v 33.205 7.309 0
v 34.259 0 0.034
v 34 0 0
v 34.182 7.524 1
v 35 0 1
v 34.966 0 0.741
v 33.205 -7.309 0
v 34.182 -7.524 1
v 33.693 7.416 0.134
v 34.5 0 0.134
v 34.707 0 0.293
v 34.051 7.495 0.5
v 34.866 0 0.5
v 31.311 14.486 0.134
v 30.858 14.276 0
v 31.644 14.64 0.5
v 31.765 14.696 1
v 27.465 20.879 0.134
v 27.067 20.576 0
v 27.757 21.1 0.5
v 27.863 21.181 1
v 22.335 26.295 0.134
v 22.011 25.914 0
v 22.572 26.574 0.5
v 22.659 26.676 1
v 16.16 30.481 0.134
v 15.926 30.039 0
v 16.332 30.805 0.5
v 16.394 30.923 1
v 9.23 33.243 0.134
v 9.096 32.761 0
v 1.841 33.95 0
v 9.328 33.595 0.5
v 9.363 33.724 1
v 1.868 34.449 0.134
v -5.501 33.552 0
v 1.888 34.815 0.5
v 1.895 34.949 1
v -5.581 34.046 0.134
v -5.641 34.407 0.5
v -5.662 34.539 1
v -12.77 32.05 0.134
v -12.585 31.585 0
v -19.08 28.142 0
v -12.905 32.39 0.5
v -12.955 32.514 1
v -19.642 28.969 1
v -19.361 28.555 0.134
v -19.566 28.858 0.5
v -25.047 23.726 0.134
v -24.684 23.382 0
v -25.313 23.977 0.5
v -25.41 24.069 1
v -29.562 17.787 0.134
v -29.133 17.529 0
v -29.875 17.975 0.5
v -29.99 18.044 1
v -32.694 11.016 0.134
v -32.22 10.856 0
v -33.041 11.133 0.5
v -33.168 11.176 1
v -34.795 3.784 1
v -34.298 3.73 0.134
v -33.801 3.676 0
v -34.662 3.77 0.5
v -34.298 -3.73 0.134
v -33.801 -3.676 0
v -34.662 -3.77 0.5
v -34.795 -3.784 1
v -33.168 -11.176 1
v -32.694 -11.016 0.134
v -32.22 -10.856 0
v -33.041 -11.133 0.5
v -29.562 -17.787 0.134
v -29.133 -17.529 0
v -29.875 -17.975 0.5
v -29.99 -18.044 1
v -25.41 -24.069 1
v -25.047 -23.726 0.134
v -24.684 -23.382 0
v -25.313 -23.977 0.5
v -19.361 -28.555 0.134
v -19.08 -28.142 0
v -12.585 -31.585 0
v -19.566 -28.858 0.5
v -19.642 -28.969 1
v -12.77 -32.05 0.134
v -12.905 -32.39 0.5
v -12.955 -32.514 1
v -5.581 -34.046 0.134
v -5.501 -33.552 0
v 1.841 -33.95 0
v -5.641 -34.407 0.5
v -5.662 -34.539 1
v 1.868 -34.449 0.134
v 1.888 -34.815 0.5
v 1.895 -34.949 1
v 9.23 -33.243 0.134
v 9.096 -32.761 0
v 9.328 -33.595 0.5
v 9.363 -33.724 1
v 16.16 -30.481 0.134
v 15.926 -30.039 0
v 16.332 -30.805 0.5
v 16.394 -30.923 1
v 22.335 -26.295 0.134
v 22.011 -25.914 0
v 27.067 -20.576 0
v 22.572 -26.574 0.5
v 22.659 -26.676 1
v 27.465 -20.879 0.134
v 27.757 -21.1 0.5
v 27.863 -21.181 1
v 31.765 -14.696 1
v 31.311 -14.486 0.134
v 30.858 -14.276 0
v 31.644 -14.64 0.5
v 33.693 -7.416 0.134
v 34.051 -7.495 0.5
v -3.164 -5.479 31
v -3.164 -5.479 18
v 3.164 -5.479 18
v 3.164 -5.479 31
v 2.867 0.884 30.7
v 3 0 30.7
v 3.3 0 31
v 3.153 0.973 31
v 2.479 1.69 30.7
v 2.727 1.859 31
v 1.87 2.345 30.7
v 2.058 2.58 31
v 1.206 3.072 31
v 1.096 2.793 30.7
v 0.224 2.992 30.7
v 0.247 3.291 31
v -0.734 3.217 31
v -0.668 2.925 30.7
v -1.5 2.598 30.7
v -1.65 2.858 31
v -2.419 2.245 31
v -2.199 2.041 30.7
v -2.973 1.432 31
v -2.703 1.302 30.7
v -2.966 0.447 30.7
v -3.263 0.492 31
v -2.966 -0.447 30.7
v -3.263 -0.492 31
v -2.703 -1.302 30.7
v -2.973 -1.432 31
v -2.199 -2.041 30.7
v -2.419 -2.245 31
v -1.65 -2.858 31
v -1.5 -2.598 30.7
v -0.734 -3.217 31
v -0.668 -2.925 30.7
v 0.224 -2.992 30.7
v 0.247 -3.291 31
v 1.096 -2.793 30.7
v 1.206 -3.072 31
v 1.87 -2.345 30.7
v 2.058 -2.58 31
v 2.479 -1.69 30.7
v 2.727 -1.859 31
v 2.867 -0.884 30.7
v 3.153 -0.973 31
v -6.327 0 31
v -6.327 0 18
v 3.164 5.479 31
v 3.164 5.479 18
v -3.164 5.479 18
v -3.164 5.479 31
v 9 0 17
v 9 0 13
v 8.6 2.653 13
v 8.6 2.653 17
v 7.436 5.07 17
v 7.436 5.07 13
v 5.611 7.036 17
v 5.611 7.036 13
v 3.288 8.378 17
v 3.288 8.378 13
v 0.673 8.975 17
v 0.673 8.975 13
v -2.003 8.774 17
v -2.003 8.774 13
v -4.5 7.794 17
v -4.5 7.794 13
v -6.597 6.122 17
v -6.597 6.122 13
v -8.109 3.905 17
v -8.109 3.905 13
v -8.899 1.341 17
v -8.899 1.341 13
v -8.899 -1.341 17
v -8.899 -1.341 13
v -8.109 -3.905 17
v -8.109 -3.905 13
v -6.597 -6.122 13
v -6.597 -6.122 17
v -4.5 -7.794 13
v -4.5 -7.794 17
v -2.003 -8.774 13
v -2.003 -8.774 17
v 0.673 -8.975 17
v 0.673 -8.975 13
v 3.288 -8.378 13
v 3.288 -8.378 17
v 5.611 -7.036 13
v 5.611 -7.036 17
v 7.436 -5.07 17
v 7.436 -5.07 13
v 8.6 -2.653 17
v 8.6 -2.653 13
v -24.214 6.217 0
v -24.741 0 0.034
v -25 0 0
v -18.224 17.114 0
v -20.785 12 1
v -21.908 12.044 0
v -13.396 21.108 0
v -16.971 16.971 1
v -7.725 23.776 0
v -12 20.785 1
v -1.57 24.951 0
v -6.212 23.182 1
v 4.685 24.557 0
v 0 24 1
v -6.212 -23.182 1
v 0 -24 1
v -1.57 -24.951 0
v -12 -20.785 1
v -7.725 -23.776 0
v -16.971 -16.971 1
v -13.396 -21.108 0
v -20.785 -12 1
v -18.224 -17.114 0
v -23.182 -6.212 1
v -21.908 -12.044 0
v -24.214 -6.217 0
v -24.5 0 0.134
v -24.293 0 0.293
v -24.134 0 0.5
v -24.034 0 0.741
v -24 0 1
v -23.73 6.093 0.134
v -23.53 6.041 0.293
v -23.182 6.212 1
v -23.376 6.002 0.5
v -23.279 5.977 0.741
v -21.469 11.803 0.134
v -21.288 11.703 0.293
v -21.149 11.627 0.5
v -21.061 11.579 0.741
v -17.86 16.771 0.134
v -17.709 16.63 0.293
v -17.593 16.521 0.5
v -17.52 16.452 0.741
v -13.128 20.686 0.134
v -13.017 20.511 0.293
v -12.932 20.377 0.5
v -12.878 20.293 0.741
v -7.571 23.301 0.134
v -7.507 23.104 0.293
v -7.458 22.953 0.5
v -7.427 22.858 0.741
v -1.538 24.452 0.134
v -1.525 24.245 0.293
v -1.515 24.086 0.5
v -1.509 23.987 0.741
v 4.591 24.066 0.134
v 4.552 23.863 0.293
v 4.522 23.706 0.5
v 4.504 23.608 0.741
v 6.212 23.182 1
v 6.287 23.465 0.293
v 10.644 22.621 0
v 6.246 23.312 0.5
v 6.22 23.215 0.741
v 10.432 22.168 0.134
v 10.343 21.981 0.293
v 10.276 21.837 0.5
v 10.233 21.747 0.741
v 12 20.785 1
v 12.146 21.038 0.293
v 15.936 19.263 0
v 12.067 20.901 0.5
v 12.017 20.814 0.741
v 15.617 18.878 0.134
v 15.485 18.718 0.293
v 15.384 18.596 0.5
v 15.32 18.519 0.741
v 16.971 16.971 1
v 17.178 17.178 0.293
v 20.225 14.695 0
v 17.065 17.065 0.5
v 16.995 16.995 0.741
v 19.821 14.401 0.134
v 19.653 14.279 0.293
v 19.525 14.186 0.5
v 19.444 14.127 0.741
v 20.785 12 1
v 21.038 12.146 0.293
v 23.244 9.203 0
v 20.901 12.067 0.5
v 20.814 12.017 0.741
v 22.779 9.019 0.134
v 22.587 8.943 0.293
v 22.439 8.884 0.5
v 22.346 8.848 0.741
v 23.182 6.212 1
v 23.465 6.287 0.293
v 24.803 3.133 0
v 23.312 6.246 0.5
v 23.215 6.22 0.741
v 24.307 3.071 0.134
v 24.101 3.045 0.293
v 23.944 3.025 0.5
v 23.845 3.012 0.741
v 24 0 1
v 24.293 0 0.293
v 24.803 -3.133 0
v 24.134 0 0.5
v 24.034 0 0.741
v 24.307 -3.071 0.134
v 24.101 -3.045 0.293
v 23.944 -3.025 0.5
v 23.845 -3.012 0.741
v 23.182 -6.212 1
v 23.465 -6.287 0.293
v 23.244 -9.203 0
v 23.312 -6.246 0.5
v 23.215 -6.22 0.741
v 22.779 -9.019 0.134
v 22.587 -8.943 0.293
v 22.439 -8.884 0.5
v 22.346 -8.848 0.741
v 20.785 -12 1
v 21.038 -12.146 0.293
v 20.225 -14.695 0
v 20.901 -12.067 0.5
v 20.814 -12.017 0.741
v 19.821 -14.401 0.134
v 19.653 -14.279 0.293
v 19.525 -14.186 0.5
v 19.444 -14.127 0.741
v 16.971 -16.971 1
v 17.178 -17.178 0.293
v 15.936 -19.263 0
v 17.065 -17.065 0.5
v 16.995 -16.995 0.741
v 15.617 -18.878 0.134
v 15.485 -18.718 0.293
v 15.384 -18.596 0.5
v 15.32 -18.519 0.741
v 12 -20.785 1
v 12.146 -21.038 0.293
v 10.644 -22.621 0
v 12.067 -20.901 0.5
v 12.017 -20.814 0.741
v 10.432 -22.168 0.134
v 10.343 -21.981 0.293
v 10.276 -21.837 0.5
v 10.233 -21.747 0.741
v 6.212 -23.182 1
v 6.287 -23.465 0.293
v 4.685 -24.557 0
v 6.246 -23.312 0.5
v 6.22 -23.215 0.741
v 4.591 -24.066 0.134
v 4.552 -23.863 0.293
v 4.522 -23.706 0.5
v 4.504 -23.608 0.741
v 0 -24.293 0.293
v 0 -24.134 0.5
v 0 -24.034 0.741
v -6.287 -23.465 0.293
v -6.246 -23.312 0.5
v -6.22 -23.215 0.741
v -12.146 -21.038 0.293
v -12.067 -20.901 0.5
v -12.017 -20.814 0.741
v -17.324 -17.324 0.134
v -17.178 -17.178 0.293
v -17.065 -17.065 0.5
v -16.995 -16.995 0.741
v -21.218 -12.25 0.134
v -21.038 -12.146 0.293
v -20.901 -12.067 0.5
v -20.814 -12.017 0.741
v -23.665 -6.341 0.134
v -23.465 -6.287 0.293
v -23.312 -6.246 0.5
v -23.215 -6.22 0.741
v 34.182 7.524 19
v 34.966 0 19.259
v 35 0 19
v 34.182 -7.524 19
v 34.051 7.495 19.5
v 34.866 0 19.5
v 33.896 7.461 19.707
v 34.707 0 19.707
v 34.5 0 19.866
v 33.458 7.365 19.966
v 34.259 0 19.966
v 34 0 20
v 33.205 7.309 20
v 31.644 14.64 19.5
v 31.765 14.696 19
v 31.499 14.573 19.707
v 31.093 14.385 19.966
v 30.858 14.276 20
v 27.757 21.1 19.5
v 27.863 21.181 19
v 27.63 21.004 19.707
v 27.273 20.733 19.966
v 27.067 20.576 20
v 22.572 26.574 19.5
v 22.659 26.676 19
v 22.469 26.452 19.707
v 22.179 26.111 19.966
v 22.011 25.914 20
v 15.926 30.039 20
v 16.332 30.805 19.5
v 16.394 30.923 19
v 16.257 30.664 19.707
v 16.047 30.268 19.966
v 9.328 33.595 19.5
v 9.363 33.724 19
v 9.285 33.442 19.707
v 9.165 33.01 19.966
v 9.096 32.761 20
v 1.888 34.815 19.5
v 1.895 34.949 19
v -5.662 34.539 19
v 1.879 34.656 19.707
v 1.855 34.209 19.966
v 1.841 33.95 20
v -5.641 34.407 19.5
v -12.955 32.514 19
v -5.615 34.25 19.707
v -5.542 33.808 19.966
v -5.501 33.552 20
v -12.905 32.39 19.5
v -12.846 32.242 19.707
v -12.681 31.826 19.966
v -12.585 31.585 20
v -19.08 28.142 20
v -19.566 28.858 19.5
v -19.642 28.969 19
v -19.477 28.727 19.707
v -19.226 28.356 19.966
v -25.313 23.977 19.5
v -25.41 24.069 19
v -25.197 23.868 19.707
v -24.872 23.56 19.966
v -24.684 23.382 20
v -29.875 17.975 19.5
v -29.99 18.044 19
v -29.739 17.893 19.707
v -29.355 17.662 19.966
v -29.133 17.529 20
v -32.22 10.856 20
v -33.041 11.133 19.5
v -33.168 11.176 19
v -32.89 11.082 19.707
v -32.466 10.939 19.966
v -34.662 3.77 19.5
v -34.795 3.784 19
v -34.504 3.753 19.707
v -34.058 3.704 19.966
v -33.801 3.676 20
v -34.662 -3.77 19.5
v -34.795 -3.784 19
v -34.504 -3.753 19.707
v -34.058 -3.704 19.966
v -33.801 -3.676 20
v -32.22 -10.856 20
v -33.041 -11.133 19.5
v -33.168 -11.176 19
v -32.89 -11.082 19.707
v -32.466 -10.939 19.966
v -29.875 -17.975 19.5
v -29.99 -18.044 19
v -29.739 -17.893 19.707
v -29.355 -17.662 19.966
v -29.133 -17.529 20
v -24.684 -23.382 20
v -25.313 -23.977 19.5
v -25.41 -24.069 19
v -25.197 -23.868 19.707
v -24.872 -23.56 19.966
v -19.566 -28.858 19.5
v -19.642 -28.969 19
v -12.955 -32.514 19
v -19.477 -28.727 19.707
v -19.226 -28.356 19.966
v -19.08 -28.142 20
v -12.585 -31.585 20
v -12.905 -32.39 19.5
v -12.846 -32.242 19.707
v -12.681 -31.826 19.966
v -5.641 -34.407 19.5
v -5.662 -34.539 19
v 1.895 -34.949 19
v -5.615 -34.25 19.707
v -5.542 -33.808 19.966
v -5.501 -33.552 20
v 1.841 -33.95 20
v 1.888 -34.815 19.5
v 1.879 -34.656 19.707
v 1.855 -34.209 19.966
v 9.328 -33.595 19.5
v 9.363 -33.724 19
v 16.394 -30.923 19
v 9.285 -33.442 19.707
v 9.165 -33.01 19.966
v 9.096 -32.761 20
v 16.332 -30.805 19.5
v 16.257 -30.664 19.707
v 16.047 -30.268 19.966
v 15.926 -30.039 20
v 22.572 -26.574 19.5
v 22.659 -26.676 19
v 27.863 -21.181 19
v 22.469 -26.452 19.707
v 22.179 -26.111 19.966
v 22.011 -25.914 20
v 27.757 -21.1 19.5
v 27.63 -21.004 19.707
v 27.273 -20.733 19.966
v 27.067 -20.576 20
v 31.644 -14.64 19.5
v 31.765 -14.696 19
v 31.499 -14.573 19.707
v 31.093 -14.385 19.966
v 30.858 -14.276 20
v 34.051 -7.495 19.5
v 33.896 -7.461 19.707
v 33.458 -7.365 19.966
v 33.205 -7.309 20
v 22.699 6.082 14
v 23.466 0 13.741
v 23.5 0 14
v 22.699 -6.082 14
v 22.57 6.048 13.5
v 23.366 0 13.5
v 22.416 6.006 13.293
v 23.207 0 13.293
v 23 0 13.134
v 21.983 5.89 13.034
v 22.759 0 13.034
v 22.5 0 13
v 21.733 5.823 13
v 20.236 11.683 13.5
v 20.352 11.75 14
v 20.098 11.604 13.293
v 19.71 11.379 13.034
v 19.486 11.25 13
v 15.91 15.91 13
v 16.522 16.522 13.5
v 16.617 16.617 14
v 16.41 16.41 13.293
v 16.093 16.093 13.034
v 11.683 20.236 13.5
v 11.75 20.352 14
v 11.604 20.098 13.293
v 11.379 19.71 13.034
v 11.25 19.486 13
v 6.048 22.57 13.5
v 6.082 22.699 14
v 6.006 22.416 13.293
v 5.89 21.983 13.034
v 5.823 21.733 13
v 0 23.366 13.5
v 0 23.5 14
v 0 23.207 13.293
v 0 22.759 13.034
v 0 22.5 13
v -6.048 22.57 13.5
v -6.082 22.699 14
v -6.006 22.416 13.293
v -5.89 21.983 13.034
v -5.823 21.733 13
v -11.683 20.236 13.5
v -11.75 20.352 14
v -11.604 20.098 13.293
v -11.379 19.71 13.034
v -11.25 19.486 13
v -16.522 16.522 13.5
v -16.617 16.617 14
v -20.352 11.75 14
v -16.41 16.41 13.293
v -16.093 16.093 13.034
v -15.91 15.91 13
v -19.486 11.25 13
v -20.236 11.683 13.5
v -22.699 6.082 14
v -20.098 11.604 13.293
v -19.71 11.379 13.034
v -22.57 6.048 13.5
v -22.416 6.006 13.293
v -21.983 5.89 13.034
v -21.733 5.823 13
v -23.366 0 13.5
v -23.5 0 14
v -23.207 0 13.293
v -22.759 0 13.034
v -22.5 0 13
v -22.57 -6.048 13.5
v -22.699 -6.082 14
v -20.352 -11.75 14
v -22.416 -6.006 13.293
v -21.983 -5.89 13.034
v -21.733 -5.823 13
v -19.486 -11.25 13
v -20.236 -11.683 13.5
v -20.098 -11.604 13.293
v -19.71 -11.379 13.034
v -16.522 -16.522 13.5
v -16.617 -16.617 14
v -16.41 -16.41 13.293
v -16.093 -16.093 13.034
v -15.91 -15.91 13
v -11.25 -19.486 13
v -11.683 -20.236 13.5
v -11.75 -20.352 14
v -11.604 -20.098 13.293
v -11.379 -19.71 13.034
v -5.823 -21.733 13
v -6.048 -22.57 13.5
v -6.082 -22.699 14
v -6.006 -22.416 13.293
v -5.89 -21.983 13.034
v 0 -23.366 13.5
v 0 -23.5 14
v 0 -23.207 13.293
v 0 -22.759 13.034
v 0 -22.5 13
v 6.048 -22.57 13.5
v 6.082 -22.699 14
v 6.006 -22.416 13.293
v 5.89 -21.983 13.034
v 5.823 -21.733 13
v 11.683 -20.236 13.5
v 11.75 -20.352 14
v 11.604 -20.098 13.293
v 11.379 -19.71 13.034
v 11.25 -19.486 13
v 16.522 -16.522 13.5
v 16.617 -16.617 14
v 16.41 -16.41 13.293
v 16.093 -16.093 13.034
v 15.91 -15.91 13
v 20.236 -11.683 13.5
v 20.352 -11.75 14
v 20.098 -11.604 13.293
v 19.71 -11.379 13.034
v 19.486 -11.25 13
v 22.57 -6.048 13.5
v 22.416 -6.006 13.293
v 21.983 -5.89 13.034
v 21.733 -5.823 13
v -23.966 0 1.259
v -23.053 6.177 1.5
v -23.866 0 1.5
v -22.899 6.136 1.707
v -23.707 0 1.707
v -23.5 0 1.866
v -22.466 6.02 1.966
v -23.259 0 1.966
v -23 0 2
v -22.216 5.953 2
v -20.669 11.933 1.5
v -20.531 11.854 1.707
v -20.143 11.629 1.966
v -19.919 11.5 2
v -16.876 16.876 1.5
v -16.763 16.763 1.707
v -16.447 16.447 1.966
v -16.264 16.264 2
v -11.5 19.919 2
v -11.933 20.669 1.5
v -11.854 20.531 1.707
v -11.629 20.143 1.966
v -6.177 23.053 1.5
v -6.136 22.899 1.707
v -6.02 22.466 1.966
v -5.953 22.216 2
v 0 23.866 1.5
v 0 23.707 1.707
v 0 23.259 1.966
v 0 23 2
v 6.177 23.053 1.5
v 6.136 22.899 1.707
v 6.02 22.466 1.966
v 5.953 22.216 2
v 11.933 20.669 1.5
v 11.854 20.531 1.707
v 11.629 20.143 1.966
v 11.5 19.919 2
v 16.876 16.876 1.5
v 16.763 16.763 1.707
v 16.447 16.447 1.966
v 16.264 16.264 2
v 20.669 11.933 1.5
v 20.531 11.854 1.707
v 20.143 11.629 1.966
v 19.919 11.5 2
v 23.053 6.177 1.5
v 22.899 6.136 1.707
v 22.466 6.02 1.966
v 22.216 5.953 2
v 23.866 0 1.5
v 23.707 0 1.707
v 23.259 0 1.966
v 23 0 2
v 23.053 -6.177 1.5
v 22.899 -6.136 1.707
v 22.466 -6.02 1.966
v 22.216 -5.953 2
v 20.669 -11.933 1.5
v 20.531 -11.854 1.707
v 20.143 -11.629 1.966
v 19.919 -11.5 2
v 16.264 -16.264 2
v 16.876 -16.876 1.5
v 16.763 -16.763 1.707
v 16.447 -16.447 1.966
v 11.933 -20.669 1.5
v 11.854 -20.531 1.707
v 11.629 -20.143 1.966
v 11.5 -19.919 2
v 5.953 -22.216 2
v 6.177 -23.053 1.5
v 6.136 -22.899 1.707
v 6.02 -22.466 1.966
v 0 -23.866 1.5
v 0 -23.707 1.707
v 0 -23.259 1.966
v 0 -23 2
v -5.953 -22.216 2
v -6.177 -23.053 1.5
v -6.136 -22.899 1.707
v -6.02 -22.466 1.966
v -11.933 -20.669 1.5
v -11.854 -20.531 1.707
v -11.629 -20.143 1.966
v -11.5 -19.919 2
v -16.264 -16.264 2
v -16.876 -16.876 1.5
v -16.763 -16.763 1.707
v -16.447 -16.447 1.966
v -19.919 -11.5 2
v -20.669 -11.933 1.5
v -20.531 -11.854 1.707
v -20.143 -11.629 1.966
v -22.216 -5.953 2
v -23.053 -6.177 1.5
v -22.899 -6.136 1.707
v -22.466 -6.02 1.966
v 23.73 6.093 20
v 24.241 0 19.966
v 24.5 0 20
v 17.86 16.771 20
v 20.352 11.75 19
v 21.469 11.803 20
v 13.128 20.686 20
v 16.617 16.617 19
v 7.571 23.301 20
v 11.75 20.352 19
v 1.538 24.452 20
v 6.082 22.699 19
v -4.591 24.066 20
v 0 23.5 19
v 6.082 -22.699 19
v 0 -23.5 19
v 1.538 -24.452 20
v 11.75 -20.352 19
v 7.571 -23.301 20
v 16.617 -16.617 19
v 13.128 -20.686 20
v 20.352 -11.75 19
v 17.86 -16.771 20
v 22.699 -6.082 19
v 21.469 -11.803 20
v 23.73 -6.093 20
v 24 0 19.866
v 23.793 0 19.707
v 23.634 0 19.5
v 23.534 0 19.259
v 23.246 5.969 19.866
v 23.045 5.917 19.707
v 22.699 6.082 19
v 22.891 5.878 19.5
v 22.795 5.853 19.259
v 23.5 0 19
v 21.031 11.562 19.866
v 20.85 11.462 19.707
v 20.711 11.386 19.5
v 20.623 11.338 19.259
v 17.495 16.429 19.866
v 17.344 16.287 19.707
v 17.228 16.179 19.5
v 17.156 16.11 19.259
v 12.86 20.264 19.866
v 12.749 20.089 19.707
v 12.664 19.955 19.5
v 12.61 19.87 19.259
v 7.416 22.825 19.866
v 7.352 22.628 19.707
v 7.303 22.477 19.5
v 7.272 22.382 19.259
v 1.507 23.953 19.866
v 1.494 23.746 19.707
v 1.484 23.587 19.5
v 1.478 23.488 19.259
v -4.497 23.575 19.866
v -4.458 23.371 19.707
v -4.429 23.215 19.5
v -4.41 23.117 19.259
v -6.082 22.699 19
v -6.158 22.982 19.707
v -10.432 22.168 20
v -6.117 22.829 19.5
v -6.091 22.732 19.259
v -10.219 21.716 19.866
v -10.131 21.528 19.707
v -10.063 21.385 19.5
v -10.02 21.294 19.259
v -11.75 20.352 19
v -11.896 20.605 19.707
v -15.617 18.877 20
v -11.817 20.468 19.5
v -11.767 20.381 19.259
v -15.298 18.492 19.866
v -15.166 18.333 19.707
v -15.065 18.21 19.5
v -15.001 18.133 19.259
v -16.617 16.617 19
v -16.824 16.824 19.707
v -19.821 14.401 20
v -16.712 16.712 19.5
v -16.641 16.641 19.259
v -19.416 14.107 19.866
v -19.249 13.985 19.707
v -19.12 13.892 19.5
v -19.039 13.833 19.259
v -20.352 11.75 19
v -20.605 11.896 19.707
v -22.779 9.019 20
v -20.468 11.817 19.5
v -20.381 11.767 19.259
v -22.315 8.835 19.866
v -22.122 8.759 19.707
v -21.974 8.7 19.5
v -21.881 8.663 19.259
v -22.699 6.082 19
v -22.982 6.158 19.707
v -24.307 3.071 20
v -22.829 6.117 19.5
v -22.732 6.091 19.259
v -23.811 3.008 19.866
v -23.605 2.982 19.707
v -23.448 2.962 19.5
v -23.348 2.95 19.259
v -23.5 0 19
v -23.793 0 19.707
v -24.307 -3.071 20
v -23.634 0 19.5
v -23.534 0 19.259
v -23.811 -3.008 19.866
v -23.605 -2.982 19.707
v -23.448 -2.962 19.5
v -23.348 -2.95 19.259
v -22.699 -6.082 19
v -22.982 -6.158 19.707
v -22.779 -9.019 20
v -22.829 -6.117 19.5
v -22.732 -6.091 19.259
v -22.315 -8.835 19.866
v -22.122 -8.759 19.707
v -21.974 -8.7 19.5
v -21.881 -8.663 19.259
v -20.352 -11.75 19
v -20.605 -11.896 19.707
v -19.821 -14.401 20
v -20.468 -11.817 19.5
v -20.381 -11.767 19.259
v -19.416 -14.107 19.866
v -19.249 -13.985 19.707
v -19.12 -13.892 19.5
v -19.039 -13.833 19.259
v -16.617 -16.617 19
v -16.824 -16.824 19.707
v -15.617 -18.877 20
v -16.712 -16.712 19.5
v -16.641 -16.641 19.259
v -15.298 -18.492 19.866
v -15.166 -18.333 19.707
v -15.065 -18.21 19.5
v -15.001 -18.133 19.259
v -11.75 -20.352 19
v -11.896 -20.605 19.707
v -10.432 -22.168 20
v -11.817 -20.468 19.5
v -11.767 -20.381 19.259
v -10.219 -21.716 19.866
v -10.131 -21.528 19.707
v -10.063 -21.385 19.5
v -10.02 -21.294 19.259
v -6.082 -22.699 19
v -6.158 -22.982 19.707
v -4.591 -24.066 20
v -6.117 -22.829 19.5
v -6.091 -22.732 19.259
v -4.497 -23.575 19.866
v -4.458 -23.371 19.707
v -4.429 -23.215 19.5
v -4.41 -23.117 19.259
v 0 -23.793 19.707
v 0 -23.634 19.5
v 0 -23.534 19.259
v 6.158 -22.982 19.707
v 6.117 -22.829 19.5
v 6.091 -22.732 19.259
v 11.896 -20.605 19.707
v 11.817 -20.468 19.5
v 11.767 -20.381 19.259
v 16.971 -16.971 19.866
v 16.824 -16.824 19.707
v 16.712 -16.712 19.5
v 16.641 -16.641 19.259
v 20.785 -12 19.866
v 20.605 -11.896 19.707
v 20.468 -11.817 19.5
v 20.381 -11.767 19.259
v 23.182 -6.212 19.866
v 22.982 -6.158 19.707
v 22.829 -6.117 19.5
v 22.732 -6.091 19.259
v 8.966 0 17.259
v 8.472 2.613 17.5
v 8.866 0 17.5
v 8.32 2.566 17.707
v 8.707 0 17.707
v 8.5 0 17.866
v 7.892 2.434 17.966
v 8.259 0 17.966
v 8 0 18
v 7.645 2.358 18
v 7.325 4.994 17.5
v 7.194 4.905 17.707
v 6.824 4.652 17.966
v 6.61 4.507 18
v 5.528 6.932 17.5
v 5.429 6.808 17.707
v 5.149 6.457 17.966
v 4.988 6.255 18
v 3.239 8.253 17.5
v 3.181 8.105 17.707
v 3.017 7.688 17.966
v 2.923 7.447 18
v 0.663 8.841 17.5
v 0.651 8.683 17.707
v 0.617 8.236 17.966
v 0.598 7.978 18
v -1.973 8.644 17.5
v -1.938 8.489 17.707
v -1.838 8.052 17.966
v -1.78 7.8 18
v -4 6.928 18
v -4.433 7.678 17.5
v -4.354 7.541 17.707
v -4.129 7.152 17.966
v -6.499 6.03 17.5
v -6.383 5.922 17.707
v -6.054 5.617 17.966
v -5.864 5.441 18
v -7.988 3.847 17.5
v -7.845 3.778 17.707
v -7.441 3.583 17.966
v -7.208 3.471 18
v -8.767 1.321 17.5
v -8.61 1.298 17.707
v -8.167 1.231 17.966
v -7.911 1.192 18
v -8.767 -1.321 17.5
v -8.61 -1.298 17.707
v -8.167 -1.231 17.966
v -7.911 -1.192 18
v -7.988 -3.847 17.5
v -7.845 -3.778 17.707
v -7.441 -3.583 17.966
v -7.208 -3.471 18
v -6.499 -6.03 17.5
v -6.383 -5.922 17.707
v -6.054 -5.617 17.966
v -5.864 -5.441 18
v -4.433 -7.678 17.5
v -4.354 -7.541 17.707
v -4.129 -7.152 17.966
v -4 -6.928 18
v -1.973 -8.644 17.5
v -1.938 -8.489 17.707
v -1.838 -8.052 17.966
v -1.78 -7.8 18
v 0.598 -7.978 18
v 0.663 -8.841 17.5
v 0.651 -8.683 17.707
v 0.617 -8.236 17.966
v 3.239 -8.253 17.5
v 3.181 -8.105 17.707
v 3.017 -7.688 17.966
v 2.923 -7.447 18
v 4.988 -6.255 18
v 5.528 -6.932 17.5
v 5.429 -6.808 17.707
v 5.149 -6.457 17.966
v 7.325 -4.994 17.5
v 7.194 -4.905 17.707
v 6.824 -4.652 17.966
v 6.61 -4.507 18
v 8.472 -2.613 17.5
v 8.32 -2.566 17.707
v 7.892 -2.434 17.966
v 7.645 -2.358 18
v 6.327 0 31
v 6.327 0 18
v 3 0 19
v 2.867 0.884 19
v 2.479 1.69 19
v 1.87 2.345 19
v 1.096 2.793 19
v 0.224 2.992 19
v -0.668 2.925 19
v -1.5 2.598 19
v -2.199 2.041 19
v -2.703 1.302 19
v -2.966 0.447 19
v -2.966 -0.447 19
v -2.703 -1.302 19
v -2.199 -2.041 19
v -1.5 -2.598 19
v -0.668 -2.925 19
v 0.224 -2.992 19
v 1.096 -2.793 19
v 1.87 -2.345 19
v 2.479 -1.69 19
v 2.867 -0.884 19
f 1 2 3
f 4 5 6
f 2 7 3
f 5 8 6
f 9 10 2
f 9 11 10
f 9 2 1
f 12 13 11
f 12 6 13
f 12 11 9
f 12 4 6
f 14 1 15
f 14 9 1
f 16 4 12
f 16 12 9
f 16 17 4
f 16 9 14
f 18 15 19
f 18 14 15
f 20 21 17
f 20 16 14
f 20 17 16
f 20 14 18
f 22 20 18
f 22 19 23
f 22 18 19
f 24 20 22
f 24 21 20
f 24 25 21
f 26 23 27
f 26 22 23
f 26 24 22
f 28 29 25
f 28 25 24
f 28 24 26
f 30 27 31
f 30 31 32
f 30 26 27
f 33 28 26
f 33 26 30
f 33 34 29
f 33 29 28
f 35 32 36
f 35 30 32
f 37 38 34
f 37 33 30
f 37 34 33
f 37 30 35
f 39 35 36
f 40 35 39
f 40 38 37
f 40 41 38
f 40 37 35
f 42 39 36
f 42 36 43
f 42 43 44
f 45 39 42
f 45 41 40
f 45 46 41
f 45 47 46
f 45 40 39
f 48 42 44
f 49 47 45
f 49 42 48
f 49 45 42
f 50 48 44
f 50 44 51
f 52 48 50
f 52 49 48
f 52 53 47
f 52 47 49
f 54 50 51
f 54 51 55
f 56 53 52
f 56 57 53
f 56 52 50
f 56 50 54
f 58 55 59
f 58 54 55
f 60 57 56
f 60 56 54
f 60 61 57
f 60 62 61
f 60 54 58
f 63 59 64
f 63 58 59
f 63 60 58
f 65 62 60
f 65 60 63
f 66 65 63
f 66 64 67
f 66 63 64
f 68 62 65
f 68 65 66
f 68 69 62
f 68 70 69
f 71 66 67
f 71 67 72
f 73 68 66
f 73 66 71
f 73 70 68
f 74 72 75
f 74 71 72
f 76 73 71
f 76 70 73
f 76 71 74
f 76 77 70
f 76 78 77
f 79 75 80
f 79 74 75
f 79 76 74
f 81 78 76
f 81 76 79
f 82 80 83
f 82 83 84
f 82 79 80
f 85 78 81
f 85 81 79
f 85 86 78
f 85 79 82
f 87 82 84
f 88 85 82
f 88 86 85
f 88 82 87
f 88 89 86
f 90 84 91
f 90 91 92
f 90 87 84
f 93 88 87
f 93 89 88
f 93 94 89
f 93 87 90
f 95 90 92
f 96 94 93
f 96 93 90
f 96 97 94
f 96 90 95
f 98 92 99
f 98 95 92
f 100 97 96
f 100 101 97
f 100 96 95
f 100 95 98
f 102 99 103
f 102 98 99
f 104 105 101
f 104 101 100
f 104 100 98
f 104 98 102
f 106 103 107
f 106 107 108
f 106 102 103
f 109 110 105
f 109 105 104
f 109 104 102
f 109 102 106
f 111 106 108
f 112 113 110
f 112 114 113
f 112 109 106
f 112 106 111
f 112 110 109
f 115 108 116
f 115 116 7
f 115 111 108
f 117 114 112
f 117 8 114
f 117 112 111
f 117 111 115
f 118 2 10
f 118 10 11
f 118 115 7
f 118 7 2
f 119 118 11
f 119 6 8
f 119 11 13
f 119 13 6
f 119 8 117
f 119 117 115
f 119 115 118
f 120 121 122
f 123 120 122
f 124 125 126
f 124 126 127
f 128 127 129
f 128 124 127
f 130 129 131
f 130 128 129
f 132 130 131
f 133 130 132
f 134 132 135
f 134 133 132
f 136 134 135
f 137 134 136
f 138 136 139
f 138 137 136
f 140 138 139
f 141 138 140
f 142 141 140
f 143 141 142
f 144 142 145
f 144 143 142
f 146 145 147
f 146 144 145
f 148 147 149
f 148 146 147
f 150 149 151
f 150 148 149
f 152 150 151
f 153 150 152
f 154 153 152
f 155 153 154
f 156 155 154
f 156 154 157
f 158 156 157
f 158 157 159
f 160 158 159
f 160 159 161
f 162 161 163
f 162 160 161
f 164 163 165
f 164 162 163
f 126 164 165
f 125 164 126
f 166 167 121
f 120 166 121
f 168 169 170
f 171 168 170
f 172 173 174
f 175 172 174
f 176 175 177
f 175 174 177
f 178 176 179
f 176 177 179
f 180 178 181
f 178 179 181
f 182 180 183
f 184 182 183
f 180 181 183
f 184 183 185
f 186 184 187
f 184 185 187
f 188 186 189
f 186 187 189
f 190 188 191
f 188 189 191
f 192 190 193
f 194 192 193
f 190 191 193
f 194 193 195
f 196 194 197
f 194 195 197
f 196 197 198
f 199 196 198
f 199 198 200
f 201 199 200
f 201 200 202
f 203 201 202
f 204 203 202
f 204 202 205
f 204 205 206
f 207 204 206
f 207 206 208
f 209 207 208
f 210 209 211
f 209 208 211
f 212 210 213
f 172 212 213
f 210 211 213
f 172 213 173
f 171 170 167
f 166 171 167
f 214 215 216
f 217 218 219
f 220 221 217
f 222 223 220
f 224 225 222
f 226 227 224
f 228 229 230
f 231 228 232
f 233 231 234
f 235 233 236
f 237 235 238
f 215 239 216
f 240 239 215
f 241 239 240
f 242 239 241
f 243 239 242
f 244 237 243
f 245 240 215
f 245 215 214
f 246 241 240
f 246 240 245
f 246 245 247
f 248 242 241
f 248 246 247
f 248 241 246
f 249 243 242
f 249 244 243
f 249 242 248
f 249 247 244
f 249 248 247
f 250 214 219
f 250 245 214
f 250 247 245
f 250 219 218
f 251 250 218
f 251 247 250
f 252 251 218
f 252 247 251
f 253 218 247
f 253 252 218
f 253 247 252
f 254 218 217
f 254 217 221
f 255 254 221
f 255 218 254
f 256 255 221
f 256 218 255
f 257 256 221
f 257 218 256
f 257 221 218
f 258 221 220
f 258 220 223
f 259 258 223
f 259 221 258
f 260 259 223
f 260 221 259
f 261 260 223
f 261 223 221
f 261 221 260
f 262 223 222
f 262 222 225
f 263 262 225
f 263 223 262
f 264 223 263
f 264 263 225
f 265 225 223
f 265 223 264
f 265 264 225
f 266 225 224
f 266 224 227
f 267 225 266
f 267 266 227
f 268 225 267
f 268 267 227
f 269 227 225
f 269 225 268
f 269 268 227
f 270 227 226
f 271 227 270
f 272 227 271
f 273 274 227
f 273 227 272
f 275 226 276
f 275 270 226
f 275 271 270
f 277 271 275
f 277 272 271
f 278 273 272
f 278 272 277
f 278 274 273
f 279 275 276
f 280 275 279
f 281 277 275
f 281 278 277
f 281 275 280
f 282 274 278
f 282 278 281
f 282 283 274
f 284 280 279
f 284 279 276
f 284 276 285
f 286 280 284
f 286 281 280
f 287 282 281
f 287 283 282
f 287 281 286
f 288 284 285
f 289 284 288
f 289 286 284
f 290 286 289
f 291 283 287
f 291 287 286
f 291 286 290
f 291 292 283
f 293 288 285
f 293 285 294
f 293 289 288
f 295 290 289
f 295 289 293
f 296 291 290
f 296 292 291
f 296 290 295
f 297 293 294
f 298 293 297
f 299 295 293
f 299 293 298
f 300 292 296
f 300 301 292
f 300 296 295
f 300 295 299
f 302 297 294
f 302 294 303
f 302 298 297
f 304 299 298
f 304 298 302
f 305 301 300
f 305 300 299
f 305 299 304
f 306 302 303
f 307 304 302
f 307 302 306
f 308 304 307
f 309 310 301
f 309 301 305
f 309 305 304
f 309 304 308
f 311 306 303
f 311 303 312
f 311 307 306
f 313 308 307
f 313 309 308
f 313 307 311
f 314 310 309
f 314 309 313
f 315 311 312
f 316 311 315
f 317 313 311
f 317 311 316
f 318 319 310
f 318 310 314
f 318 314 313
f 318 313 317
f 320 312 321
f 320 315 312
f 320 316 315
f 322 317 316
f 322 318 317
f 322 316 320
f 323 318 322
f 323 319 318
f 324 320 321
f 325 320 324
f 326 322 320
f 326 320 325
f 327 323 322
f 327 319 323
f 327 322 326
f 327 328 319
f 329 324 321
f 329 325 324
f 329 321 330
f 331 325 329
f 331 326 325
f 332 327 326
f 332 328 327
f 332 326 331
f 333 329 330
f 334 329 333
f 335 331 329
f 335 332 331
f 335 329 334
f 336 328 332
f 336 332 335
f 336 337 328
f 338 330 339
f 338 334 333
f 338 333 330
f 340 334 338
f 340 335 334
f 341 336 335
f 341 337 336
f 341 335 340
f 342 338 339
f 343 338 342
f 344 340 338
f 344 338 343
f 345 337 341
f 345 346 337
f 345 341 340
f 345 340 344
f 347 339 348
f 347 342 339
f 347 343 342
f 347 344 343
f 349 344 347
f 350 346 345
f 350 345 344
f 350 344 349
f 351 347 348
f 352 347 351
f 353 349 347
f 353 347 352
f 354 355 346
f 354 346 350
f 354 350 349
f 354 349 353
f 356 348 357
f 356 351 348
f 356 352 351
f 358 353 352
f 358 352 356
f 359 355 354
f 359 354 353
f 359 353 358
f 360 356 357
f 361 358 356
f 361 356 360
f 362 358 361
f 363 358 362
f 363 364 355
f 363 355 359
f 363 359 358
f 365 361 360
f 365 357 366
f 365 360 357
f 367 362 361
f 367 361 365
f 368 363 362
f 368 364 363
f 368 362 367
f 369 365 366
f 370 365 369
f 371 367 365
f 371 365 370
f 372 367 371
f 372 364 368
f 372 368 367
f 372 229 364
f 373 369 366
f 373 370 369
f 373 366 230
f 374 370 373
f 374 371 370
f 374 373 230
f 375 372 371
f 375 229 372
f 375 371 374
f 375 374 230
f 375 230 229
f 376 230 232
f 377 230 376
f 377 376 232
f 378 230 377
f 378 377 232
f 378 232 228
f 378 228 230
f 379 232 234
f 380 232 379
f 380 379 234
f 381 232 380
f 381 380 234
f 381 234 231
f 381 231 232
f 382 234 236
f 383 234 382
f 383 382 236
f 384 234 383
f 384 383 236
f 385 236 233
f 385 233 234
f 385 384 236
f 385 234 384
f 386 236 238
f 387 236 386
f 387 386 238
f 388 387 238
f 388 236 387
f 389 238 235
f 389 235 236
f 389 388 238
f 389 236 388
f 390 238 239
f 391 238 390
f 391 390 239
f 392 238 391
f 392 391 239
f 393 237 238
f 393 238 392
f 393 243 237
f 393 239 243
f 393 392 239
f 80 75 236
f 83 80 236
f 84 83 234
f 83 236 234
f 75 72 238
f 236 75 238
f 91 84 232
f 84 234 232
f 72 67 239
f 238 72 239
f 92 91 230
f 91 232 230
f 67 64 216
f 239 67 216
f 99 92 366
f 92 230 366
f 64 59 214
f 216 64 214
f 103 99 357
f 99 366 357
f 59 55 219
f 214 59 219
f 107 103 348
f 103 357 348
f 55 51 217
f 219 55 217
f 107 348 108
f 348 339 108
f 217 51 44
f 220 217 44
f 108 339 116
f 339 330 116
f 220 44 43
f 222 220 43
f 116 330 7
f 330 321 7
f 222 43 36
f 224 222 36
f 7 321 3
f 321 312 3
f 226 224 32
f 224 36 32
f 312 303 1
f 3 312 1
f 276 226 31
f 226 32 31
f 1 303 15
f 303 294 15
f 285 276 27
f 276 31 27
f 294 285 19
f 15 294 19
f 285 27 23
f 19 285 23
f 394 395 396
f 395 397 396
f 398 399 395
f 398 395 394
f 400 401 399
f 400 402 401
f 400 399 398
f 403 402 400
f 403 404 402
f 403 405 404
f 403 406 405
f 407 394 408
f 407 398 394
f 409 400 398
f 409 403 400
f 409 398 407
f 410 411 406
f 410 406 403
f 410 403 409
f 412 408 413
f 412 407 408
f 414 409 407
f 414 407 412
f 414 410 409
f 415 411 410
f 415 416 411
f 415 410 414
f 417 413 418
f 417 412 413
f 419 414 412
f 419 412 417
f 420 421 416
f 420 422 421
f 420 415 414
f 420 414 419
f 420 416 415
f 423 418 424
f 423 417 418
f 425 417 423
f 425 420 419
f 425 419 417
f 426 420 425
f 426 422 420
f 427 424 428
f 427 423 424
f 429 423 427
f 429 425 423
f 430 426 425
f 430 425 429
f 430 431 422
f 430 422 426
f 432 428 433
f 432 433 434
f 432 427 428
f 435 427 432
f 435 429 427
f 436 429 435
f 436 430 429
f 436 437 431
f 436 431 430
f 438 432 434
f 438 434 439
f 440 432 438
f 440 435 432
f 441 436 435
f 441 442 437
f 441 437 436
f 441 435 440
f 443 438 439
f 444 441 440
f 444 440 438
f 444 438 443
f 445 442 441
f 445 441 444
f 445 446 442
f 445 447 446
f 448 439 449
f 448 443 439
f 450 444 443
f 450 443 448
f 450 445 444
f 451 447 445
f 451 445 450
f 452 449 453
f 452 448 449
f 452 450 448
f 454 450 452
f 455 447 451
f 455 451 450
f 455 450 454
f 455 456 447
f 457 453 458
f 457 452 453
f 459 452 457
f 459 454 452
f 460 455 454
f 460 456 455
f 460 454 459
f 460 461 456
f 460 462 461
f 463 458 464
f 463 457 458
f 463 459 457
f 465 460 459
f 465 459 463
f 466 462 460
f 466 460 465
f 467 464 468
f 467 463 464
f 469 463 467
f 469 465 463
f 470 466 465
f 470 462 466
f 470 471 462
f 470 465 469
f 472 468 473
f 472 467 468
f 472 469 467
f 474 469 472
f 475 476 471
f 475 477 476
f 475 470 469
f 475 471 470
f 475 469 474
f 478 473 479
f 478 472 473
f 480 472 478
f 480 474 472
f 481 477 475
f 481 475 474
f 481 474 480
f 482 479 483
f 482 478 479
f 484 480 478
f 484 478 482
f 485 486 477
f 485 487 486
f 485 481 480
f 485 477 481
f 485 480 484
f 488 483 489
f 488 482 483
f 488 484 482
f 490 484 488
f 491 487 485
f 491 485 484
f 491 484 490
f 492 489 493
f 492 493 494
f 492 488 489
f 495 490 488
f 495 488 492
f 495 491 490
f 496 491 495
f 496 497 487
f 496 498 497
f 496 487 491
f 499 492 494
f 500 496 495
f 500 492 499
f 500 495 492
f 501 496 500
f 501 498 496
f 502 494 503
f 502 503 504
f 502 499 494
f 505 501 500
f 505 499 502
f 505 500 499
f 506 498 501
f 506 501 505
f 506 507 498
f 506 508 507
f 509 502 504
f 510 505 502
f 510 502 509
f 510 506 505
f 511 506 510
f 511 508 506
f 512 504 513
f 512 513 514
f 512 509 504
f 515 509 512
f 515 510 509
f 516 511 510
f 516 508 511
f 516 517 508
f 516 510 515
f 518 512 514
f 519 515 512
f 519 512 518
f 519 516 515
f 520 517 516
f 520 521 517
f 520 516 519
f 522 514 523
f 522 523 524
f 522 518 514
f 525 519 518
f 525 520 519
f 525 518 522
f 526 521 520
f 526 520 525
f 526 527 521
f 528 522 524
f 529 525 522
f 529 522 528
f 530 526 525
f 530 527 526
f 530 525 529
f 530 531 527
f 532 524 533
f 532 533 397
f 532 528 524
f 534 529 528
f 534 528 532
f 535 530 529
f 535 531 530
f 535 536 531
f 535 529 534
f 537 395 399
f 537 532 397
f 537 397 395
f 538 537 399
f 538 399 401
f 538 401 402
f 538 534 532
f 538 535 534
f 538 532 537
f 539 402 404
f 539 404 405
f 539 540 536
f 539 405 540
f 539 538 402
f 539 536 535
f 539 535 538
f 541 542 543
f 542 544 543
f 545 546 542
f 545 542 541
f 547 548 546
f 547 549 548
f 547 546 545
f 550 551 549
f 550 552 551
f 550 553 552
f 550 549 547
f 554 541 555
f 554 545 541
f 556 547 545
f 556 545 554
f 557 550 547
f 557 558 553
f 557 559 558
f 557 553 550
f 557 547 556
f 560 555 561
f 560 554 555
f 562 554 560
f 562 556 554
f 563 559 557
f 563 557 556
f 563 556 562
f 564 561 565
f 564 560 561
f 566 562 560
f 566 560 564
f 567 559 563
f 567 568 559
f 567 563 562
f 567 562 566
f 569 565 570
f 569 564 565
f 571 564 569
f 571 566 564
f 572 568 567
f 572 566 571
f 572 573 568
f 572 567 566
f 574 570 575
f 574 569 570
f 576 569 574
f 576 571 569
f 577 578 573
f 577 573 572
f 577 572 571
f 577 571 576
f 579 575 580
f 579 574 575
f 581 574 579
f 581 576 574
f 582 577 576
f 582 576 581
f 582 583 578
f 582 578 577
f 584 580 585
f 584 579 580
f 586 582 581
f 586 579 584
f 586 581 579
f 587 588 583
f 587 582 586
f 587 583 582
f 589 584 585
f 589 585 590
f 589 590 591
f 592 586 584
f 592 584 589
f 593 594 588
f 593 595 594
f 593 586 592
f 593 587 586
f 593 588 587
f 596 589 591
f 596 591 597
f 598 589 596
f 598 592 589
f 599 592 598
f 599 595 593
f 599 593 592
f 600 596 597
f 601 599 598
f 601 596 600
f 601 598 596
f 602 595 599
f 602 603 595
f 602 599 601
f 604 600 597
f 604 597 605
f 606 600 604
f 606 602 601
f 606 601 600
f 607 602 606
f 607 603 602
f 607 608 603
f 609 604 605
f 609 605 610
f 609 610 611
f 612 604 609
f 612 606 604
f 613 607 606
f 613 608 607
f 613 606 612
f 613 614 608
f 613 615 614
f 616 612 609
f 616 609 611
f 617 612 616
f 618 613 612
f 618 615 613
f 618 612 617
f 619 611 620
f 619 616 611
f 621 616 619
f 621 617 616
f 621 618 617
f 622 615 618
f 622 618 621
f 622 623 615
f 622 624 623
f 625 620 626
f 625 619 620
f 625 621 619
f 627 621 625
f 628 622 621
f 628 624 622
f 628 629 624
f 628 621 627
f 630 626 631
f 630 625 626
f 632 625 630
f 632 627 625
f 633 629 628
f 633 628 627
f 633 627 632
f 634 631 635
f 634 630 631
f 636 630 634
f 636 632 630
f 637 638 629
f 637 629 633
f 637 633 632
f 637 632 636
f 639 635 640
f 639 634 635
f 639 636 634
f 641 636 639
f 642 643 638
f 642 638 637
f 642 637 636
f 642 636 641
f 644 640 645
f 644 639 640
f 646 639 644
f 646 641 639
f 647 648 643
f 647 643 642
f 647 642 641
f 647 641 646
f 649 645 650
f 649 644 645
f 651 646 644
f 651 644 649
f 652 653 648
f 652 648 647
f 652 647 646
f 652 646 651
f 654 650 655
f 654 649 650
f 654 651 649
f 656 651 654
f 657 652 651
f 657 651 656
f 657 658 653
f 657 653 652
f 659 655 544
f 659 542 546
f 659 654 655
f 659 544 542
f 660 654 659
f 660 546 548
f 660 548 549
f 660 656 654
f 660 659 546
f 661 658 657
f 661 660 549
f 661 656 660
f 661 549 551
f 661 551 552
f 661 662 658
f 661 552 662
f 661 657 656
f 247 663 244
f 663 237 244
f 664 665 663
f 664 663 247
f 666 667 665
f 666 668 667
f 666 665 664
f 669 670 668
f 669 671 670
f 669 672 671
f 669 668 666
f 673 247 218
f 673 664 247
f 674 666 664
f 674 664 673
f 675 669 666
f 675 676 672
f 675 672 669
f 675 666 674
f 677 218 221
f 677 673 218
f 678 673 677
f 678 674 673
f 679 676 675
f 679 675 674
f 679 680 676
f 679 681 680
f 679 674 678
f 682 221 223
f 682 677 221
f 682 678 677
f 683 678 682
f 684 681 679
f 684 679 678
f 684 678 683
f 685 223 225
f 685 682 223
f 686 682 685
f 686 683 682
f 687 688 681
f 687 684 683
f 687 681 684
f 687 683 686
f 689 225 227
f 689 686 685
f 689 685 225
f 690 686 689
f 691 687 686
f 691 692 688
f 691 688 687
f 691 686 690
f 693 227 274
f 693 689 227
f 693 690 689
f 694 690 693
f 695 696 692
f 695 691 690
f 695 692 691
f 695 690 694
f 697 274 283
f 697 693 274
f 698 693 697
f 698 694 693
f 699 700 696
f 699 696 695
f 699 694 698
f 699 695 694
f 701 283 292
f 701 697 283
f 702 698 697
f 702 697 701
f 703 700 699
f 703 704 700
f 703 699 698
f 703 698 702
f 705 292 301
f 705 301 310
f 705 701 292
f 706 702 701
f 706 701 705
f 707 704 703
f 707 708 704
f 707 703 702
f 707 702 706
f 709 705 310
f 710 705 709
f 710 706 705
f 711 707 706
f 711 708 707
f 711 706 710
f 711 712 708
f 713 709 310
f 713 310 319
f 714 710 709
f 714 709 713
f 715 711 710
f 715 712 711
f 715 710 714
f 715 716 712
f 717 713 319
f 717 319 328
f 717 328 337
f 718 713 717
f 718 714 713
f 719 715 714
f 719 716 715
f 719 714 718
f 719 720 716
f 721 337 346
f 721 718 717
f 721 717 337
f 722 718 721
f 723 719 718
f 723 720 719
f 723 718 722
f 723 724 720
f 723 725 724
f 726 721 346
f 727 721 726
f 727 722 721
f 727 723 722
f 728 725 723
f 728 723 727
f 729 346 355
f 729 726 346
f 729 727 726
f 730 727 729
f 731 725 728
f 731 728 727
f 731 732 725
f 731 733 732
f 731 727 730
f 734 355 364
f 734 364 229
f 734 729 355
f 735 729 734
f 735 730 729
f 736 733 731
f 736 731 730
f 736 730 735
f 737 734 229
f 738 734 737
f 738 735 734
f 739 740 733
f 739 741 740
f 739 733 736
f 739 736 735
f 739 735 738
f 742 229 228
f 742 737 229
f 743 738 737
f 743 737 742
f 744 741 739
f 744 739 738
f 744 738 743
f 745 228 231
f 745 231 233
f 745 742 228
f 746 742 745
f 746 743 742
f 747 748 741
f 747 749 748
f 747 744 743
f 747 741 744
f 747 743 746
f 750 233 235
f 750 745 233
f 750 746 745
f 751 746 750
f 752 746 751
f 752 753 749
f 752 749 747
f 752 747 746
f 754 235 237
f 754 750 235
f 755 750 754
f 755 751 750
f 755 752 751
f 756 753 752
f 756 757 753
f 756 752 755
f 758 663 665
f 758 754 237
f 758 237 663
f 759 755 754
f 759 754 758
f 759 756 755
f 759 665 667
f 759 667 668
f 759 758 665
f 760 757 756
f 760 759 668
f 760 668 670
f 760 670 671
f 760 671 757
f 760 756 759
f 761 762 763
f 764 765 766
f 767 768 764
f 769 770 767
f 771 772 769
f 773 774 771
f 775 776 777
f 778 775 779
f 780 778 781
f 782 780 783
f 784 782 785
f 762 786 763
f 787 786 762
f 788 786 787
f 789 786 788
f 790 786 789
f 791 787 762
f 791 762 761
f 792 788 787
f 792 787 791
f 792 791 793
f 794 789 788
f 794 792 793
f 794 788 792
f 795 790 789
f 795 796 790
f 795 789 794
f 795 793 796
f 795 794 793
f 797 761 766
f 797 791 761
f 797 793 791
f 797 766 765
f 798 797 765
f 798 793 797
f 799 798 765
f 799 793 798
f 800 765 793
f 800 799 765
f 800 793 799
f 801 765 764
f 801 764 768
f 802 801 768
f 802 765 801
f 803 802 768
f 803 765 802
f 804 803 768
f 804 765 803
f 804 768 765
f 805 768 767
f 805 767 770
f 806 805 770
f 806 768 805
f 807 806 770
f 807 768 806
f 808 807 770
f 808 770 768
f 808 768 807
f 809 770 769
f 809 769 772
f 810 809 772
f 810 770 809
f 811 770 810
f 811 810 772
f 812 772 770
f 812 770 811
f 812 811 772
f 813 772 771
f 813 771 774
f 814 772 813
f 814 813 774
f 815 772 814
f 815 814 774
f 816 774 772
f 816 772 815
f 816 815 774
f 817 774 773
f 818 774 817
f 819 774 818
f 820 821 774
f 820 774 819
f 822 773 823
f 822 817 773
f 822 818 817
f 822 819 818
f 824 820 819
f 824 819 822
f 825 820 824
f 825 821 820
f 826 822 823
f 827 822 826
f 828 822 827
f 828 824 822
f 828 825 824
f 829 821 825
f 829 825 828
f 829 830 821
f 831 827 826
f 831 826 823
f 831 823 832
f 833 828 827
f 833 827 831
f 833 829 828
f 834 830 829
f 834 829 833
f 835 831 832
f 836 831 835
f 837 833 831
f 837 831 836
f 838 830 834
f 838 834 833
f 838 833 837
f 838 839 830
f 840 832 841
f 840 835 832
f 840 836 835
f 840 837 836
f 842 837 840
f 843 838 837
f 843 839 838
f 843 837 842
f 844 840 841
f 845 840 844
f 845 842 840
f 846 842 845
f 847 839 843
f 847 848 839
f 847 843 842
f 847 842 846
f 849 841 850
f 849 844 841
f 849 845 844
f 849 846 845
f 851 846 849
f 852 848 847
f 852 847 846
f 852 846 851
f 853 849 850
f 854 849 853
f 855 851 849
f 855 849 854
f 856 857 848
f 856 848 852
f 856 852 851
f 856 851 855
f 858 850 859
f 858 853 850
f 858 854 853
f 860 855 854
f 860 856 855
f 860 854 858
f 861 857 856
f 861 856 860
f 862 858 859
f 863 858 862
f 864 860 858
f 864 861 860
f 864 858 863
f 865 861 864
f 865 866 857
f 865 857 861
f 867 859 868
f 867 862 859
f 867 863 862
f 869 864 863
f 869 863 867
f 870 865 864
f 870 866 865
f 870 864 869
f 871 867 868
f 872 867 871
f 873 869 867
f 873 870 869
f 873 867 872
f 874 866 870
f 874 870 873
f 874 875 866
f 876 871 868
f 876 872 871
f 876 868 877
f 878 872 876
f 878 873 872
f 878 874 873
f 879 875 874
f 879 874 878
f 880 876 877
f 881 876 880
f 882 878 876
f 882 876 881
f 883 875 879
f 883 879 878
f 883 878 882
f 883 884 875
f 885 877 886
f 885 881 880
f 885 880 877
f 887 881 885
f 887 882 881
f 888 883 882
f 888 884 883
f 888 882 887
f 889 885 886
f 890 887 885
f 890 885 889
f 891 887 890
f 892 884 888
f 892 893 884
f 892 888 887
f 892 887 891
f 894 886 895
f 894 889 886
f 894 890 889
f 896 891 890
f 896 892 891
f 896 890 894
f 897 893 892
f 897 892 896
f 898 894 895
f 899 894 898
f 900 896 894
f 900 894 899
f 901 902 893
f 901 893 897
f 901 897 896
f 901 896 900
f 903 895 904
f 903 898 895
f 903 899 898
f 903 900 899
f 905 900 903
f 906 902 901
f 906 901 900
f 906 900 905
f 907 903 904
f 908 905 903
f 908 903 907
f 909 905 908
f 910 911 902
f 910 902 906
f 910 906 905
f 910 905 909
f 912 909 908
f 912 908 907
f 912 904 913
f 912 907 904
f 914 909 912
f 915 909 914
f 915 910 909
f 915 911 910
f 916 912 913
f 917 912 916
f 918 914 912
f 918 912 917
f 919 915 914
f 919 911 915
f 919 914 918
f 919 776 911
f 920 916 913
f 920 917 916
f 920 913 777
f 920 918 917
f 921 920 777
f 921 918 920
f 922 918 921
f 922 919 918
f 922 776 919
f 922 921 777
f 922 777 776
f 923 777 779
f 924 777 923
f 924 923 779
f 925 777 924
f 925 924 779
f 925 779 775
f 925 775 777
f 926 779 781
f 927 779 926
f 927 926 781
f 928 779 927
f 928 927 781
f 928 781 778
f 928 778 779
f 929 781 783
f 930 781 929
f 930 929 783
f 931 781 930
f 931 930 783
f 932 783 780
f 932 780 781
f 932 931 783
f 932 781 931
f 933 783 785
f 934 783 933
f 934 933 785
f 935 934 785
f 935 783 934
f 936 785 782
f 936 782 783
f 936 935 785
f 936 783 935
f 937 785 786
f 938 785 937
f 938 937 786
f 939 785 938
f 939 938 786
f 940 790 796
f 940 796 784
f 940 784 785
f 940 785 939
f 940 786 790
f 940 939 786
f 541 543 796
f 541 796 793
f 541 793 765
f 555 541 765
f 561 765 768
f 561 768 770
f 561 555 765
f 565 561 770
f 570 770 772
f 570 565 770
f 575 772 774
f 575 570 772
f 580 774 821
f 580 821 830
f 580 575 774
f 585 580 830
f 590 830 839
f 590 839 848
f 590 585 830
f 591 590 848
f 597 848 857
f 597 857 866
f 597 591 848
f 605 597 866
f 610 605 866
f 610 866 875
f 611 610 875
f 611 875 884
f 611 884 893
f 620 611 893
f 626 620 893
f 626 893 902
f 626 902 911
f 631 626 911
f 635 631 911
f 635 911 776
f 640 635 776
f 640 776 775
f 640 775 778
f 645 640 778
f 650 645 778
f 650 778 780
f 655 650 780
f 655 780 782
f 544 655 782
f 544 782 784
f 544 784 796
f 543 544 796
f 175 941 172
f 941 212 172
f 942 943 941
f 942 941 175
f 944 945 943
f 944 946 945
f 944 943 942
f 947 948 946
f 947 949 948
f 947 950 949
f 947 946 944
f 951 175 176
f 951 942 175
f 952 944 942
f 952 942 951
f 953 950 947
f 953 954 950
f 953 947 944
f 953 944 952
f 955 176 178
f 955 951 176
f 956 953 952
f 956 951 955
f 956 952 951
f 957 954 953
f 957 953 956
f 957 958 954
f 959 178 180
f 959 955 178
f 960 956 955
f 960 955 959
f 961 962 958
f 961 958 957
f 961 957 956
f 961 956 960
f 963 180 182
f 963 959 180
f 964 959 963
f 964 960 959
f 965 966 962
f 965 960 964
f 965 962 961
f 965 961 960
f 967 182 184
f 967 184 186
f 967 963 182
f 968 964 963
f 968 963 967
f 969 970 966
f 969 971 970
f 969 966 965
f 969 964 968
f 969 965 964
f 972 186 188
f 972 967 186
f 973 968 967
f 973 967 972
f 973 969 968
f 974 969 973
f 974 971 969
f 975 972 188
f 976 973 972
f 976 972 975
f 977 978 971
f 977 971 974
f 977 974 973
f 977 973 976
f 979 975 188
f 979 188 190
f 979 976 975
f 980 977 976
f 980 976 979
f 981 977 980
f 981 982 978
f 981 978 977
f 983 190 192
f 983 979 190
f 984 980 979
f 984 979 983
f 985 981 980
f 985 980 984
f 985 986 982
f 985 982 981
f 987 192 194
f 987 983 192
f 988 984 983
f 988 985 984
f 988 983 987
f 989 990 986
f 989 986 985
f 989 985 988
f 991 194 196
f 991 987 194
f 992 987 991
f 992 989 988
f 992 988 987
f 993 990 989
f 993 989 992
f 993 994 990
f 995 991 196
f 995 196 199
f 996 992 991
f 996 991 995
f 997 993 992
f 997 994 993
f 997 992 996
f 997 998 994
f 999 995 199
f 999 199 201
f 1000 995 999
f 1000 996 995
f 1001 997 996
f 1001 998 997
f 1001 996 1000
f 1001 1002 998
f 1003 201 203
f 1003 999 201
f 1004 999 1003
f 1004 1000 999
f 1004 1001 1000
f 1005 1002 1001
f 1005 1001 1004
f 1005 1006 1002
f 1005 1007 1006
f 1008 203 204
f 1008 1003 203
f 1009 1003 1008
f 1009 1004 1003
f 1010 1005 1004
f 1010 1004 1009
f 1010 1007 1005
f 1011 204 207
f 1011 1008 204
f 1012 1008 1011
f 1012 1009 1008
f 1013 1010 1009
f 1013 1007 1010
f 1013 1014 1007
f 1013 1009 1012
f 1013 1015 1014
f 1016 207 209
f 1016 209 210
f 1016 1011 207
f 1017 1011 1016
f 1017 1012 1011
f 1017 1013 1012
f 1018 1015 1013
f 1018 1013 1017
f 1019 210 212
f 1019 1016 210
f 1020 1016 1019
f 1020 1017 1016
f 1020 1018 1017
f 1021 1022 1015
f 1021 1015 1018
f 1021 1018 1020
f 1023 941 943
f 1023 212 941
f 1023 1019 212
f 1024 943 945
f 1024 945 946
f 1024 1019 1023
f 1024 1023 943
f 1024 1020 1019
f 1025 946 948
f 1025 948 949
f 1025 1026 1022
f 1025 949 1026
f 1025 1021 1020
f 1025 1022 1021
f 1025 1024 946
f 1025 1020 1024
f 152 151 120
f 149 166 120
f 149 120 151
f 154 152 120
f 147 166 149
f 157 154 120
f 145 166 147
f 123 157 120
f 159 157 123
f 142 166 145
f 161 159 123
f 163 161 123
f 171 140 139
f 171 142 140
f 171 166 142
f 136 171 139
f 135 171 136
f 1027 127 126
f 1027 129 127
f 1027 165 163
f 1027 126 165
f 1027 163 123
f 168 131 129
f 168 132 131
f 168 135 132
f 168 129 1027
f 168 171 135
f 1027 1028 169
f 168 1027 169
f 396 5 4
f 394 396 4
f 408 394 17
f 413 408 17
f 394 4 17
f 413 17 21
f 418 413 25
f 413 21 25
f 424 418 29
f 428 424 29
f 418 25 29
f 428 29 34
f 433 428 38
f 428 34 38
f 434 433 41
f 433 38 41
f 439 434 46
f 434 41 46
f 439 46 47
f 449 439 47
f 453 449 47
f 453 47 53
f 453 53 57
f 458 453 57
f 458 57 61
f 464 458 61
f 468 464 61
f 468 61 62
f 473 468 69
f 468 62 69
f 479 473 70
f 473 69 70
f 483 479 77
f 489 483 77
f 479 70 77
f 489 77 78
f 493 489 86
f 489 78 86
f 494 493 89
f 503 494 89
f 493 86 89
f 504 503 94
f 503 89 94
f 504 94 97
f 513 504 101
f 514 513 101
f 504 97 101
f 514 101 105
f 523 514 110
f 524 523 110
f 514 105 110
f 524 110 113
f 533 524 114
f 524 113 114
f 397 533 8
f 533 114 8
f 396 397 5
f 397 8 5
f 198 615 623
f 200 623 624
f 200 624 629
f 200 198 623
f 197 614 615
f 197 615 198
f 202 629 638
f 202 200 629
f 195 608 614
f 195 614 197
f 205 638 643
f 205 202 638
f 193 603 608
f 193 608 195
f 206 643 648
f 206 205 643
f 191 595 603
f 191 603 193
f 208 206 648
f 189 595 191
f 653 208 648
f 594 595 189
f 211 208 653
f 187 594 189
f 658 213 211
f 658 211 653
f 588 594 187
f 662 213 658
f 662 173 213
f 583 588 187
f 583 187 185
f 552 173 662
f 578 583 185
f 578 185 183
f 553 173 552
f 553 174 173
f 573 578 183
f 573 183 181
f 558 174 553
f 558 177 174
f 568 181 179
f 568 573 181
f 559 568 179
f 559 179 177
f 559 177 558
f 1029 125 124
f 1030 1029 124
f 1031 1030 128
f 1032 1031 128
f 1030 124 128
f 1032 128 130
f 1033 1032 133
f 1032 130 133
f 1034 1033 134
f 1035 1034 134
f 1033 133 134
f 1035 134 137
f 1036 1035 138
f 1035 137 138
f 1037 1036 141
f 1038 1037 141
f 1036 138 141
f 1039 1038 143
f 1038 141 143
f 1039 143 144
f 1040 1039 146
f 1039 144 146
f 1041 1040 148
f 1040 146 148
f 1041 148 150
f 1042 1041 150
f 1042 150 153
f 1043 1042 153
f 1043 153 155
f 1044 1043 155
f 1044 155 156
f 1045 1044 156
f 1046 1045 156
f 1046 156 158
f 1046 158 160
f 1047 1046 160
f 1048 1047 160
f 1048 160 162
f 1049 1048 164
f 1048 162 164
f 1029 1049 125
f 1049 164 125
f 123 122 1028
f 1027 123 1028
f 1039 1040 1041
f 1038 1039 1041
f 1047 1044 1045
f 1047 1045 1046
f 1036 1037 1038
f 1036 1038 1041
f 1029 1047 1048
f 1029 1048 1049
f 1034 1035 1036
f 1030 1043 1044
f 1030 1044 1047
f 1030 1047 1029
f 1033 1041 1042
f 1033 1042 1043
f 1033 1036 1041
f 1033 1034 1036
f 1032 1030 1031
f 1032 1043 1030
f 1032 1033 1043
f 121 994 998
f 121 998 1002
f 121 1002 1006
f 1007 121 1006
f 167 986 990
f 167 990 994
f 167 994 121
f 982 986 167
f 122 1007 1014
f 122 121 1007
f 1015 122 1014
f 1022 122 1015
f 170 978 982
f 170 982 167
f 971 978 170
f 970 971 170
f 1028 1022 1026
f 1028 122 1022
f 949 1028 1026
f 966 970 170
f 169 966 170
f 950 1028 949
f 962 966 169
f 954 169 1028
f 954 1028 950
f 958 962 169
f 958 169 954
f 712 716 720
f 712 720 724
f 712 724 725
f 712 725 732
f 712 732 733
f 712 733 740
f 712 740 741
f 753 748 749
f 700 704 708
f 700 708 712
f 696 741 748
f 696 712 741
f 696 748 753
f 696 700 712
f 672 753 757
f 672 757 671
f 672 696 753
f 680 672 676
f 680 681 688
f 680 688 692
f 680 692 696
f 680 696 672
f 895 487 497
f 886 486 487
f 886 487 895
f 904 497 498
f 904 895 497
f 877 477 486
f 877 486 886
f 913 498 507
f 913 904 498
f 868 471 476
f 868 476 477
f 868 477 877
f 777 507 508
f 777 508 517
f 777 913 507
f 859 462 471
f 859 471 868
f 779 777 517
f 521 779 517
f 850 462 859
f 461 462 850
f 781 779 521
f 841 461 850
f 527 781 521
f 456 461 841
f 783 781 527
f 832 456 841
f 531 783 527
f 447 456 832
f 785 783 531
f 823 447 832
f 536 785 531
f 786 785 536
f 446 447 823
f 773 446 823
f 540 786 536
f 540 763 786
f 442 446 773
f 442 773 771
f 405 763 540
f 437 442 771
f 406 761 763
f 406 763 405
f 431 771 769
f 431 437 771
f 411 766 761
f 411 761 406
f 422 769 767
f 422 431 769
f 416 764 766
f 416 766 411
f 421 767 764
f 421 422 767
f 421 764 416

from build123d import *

# Parameters (mm, degrees)
SKETCH_1_R          = 35
SKETCH_1_R_2        = 23.5
EXTRUDE_1_DEPTH     = 20
SKETCH_2_R          = 23.5
EXTRUDE_2_DEPTH     = 18
EXTRUDE_3_DEPTH     = 13
CUT_EXTRUDE_START   = -5
SKETCH_4_R          = 23.5
SKETCH_4_R_2        = 9
CUT_EXTRUDE_1_DEPTH = 5
SKETCH_5_R          = 3
CUT_EXTRUDE_2_DEPTH = 12
SKETCH_7_R          = 24
CUT_EXTRUDE_3_DEPTH = 2
FILLET_1_R          = 1
CHAMFER_1_SIZE      = 0.3


with BuildPart() as part:
    # 草图1 → 凸台-拉伸1 (new body)
    with BuildSketch(Plane.XY):
        Circle(SKETCH_1_R)
        Circle(SKETCH_1_R_2, mode=Mode.SUBTRACT)
    extrude(amount=EXTRUDE_1_DEPTH)

    # 草图2 → 凸台-拉伸2 (add)
    with BuildSketch(Plane.XY):
        Circle(SKETCH_2_R)
    extrude(amount=EXTRUDE_2_DEPTH)

    # 草图3 → 凸台-拉伸3 (add)
    with BuildSketch(Plane.XY.offset(18)):
        Polygon((6.327155881, 0), (3.163577941, 5.479477727), (-3.163577941, 5.479477727), (-6.327155881, 0), (-3.163577941, -5.479477727), (3.163577941, -5.479477727), align=None)
    extrude(amount=EXTRUDE_3_DEPTH)

    # 草图4 → 切除-拉伸1 (cut)
    with BuildSketch(Plane.XY.offset(18).offset(CUT_EXTRUDE_START)):
        Circle(SKETCH_4_R)
        Circle(SKETCH_4_R_2, mode=Mode.SUBTRACT)
    extrude(amount=CUT_EXTRUDE_1_DEPTH, mode=Mode.SUBTRACT)

    # 草图5 → 切除-拉伸2 (cut)
    with BuildSketch(Plane.XY.offset(31)):
        Circle(SKETCH_5_R)
    extrude(amount=-CUT_EXTRUDE_2_DEPTH, mode=Mode.SUBTRACT)

    # 草图7 → 切除-拉伸3 (cut)
    with BuildSketch(Plane(origin=(0, 0, 0), x_dir=(-1, 0, 0), z_dir=(0, 0, -1))):
        Circle(SKETCH_7_R)
    extrude(amount=-CUT_EXTRUDE_3_DEPTH, mode=Mode.SUBTRACT)

    # 圆角1
    fillet_1_edges = [part.edges().sort_by_distance(p)[0] for p in [
        (-35, 0, 0),
        (-23.5, 0, 13),
        (-9, 0, 18),
        (24, 0, 2),
        (24, 0, 0),
        (-35, 0, 20),
        (-23.5, 0, 20),
    ]]
    fillet(fillet_1_edges, radius=FILLET_1_R - 0.0001)  # a hair under: the kernel refuses the full size

    # 倒角1
    chamfer_1_edges = [part.edges().sort_by_distance(p)[0] for p in [
        (-3, 0, 31),
    ]]
    chamfer(chamfer_1_edges, length=CHAMFER_1_SIZE)


solid = part.part
